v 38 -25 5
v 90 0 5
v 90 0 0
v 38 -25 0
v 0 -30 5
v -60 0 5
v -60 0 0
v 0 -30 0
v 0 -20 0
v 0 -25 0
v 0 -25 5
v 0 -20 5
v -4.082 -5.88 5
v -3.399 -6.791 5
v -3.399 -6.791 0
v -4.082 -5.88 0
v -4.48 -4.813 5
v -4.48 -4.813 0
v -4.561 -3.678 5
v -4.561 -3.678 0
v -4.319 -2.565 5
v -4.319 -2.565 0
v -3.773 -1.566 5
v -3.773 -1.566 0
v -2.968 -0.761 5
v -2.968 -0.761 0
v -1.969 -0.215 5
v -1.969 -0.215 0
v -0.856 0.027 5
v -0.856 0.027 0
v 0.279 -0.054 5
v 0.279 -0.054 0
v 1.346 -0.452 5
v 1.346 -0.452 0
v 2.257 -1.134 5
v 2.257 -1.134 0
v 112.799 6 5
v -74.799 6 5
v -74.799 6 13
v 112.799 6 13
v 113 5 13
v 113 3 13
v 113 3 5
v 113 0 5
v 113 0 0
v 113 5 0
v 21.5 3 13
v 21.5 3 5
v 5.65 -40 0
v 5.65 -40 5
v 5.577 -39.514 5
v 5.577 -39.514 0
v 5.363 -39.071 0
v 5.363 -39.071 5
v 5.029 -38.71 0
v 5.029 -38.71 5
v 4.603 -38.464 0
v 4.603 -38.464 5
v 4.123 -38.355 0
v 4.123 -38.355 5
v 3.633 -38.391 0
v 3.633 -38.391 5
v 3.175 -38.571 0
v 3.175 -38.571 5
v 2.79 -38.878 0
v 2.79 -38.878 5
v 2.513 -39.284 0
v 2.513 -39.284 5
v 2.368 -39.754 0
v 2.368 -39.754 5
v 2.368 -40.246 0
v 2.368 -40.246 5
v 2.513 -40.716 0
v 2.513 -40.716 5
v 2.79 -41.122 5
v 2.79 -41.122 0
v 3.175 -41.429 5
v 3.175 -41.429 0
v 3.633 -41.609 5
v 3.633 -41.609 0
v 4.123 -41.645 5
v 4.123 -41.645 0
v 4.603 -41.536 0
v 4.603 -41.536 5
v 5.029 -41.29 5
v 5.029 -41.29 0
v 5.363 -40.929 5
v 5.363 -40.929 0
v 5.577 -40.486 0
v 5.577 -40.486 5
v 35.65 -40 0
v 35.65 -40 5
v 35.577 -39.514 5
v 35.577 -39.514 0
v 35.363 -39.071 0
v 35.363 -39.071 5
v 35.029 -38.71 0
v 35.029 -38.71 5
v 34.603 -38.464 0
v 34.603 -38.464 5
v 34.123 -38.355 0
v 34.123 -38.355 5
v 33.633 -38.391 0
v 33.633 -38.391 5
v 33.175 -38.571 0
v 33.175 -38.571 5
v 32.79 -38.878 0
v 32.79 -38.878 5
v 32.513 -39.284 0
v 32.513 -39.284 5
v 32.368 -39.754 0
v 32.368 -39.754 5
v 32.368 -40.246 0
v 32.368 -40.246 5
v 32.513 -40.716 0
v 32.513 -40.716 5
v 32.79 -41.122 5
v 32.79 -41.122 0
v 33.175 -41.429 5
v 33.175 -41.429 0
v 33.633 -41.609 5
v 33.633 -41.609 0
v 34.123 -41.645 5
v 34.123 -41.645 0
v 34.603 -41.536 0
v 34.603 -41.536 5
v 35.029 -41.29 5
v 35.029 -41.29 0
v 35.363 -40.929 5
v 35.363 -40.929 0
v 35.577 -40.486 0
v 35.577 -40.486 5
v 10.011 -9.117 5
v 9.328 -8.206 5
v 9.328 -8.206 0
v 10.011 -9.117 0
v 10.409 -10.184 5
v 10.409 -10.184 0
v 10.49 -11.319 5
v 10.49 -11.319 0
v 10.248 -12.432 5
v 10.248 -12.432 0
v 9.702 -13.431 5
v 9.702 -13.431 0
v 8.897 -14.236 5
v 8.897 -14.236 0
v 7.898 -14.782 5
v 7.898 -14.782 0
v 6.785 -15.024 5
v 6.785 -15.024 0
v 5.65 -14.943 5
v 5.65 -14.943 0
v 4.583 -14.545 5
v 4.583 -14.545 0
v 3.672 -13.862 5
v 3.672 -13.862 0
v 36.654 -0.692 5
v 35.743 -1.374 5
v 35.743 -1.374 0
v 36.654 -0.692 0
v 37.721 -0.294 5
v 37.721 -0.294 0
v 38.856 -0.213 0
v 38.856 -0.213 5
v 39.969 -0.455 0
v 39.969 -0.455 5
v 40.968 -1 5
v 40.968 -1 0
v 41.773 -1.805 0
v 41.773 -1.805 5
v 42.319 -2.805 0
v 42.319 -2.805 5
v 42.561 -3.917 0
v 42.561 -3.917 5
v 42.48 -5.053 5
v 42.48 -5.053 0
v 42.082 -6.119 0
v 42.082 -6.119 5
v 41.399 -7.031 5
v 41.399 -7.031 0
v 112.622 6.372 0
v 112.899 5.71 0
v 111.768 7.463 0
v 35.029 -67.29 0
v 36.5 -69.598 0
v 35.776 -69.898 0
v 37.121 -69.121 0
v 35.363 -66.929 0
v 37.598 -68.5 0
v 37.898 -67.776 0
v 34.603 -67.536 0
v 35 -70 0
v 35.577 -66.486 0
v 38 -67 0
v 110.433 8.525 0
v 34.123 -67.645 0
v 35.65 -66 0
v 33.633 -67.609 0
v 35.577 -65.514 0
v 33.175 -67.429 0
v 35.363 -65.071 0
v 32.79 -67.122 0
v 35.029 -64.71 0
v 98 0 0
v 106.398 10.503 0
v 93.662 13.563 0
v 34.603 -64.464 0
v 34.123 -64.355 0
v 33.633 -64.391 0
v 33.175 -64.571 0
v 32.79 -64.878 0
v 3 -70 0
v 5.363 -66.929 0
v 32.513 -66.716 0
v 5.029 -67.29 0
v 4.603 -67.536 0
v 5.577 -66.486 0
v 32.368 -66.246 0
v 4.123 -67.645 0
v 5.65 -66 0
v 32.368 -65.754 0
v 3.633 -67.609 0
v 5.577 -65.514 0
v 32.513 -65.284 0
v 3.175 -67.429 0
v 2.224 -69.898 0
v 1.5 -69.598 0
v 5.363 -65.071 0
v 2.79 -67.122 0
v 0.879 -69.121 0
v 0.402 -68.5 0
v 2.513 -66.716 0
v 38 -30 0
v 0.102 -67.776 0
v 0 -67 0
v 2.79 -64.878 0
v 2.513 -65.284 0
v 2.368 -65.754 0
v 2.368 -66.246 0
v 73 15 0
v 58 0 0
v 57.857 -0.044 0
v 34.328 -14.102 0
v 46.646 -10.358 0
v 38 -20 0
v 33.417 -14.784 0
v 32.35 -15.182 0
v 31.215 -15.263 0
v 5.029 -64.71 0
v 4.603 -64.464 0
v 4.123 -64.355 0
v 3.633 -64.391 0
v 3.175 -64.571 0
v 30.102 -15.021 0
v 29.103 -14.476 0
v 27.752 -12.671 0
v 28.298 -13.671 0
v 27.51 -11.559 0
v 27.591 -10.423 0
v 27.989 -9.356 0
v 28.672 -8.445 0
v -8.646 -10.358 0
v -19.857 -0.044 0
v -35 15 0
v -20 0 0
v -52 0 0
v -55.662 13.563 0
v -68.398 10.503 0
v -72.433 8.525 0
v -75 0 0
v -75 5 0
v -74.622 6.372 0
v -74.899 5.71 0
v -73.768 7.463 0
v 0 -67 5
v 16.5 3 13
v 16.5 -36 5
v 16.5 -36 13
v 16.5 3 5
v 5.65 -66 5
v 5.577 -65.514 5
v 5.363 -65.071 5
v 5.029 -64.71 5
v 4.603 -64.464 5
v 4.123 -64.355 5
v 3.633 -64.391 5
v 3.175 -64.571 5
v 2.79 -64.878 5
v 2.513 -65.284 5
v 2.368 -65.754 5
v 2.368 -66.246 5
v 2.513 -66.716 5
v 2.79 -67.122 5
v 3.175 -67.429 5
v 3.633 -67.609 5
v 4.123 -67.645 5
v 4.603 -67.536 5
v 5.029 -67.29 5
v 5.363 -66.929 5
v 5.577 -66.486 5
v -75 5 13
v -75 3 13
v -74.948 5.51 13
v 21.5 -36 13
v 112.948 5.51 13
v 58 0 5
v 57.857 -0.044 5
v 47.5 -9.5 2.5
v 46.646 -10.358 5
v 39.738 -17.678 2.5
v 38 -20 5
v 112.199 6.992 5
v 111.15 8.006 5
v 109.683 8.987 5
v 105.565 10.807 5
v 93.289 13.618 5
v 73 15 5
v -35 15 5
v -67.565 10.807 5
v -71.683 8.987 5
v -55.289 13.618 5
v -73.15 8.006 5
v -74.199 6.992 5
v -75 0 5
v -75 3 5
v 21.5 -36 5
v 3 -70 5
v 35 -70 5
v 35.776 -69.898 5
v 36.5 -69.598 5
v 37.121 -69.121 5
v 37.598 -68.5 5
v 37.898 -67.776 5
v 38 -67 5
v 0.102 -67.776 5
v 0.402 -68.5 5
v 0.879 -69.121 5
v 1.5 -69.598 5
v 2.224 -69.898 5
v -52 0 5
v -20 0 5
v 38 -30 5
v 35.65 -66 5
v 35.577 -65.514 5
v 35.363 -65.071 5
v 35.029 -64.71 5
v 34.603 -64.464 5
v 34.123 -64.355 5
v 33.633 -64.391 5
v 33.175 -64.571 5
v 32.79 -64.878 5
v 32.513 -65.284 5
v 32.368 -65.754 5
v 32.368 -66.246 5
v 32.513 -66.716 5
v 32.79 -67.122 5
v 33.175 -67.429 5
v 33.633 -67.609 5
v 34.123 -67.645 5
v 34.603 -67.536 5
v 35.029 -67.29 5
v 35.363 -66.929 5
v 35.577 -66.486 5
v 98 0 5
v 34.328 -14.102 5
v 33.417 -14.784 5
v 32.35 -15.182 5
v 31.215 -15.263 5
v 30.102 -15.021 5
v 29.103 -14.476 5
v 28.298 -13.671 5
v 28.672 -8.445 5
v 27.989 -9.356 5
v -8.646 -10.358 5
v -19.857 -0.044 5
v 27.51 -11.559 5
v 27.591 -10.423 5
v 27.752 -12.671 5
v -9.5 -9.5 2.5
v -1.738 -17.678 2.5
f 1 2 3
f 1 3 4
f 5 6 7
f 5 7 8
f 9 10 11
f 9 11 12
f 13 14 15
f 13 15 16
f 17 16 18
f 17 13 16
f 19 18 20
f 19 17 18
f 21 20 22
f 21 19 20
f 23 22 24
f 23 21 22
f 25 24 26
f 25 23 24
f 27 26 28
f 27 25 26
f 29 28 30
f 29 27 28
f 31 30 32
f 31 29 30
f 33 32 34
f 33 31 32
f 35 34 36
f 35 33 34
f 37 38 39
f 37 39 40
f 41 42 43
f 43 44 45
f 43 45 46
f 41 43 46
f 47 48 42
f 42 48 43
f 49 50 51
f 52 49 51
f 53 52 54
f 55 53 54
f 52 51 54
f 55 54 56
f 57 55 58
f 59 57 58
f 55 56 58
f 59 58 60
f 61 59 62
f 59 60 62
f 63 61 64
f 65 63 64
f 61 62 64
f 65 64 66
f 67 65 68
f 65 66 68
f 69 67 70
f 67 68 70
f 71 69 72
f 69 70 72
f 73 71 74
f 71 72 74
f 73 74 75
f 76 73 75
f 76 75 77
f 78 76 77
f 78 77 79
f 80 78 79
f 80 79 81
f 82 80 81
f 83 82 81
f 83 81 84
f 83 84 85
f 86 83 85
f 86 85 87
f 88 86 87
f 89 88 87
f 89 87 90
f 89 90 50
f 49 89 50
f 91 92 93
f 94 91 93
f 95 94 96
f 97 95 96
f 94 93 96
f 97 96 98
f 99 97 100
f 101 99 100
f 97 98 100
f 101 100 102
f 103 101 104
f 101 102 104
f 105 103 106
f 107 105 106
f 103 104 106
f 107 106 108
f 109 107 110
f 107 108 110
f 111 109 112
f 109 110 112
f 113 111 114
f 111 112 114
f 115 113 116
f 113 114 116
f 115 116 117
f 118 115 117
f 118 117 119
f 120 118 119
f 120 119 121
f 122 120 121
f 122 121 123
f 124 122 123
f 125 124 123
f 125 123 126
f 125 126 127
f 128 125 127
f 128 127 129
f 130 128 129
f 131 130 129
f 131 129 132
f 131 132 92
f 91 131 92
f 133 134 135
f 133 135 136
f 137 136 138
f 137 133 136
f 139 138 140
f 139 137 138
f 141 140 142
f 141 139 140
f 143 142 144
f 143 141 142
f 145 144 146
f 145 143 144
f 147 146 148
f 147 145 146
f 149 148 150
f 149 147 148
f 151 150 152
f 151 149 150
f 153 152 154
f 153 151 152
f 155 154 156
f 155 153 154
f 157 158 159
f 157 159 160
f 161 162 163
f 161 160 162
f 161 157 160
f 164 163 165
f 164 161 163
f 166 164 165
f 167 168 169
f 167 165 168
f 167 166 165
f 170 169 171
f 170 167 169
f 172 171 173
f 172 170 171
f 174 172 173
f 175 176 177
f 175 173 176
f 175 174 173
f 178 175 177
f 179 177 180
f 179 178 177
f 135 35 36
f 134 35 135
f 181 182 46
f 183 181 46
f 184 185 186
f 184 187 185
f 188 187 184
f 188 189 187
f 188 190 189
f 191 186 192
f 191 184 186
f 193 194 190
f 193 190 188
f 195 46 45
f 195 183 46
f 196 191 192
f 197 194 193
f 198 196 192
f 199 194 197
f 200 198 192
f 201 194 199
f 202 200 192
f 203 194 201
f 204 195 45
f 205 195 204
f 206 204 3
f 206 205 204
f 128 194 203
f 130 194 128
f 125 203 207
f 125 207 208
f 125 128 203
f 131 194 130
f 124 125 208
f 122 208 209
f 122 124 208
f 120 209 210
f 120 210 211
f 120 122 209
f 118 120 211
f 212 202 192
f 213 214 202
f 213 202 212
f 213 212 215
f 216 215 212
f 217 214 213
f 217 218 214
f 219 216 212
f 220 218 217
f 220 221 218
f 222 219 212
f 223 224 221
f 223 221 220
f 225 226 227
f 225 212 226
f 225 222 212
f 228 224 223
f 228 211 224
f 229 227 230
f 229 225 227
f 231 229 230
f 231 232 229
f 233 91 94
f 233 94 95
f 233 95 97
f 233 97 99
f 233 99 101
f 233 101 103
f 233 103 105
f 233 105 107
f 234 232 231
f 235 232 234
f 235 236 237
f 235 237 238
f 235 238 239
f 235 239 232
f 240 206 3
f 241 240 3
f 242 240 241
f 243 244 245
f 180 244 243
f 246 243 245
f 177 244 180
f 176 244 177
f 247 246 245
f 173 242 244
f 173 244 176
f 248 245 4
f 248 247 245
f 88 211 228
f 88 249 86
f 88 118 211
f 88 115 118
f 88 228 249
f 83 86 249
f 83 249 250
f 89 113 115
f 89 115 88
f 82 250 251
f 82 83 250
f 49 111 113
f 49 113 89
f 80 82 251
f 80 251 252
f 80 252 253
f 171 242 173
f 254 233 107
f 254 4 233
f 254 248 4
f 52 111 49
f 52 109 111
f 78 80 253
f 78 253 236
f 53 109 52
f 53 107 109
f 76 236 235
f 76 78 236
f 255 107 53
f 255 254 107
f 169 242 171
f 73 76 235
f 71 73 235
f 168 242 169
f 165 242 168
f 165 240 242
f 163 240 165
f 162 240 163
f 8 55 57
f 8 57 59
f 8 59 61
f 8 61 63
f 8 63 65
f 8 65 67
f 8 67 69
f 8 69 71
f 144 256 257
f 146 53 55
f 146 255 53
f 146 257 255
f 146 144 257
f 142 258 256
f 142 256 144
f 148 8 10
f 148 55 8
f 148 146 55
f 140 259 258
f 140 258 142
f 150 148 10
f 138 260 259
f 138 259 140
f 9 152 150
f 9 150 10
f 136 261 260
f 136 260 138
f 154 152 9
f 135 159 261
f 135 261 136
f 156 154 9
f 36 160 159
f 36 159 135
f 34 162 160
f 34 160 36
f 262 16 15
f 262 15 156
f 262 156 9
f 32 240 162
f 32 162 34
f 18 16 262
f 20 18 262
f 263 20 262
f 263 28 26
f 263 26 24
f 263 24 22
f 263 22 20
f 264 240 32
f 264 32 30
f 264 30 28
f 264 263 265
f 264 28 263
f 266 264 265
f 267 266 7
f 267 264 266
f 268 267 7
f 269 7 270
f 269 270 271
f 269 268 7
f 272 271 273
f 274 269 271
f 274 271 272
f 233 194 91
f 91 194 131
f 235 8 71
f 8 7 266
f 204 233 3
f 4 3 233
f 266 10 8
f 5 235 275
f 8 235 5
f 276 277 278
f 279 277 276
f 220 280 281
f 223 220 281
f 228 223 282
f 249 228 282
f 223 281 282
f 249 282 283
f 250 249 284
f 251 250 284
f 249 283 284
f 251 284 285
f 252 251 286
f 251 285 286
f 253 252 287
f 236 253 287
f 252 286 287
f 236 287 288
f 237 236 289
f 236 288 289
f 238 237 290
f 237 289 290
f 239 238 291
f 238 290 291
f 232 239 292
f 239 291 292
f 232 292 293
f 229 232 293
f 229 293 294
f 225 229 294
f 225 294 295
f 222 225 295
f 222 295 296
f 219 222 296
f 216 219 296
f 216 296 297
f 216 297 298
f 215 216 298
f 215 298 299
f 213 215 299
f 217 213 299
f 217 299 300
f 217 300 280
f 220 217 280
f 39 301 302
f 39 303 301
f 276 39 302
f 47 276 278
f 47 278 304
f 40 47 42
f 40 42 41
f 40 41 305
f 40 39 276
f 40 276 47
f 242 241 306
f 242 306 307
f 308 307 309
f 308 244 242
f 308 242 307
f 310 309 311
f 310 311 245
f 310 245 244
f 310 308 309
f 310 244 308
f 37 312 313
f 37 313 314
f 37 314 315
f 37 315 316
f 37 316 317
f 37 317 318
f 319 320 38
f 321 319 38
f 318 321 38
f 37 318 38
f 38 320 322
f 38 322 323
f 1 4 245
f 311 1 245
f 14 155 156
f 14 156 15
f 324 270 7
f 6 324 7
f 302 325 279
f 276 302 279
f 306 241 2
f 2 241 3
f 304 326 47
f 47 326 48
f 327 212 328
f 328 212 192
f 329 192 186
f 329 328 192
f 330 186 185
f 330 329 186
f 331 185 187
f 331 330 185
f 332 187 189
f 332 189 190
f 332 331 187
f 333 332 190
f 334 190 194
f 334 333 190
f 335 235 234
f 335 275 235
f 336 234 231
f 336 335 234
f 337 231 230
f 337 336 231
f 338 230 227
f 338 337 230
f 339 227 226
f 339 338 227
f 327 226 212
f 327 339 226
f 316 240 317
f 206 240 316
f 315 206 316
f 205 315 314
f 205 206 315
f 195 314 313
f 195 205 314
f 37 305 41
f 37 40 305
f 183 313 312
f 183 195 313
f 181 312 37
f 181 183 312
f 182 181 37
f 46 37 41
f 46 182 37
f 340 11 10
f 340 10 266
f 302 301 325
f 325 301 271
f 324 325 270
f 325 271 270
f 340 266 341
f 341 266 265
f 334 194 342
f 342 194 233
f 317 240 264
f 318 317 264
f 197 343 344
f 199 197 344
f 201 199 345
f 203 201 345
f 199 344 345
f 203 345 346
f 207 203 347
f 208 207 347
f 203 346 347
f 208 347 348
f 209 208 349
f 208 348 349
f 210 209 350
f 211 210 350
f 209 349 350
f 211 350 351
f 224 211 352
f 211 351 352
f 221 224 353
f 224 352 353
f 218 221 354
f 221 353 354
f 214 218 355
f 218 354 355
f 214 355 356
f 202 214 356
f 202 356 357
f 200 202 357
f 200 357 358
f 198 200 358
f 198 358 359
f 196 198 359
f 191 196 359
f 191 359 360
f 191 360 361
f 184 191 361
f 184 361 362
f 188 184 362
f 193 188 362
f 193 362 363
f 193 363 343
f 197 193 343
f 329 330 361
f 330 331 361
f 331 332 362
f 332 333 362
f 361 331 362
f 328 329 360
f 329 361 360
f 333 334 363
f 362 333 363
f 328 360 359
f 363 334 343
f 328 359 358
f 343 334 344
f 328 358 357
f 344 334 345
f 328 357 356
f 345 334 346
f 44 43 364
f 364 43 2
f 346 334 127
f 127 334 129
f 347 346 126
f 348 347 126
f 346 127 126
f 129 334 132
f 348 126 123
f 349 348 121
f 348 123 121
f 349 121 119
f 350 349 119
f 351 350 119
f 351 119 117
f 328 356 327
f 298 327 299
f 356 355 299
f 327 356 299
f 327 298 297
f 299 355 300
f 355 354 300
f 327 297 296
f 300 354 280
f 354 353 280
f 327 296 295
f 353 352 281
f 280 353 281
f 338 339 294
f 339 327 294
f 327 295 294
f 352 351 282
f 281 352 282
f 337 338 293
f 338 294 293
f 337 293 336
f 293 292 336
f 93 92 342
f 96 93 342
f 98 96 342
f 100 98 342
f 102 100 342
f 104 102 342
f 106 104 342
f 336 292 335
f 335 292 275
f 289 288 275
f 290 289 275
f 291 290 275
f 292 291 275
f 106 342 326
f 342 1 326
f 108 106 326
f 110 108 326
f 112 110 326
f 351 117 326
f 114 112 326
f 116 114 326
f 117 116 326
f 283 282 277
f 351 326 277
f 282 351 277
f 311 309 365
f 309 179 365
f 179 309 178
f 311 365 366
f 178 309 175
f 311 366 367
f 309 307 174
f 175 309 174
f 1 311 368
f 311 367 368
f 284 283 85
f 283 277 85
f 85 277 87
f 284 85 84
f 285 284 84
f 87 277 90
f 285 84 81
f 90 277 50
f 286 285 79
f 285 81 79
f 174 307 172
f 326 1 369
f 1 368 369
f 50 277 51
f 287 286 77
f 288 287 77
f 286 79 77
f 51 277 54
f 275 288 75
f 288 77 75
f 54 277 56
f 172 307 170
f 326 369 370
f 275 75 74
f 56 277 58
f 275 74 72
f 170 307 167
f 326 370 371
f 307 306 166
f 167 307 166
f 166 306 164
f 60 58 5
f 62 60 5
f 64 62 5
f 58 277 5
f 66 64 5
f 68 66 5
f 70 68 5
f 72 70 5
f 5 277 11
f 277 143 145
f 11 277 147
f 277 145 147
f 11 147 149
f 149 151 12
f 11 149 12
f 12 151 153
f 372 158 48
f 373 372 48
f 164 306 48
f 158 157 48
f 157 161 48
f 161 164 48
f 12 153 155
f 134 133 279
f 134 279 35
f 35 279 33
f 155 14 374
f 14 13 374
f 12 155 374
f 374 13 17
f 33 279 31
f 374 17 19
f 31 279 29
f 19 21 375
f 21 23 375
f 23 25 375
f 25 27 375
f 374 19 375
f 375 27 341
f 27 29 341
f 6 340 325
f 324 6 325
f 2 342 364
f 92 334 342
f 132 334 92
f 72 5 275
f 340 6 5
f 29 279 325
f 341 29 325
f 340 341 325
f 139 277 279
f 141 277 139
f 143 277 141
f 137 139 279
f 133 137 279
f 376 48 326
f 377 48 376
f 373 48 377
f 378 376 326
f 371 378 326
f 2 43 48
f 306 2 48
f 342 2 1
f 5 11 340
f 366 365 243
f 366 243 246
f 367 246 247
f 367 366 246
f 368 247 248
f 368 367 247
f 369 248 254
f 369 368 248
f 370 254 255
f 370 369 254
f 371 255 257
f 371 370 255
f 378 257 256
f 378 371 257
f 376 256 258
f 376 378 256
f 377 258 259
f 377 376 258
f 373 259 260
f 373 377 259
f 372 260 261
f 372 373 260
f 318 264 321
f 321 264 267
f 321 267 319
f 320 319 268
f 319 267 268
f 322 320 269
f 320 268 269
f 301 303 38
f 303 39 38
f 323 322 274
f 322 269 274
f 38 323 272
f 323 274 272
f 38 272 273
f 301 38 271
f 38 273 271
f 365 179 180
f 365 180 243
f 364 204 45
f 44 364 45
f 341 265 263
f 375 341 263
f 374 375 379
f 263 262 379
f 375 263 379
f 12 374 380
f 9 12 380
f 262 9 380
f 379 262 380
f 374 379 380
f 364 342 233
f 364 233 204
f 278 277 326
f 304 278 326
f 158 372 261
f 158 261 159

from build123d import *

# Parameters (mm, degrees)
SKETCH1_W           = 38
SKETCH1_H           = 70
BOSS_EXTRUDE1_DEPTH = 5
SKETCH2_R           = 1.65
CUT_EXTRUDE1_DEPTH  = 134.018795664
FILLET1_R           = 3
FILLET2_DEPTH       = 5
SKETCH3_W           = 188
SKETCH3_H           = 3
BOSS_EXTRUDE2_DEPTH = 8
SKETCH4_W           = 5
SKETCH4_H           = 39
BOSS_EXTRUDE3_DEPTH = 8
BOSS_EXTRUDE4_DEPTH = 5
FILLET3_SIZE        = 40
FILLET3_SIZE_2      = 10
FILLET4_SIZE        = 40
FILLET4_SIZE_2      = 10
CUT_EXTRUDE2_DEPTH  = 134.165310942


with BuildPart() as part:
    # Sketch1 → Boss-Extrude1 (new body)
    with BuildSketch(Plane.XY):
        with Locations((19, -35)):
            Rectangle(SKETCH1_W, SKETCH1_H)
        Polygon((-75, 15), (-75, 0), (0, 0), (38, 0), (113, 0), (113, 15), align=None)
    extrude(amount=BOSS_EXTRUDE1_DEPTH)

    # Sketch2 → Cut-Extrude1 (cut, through all)
    with BuildSketch(Plane.XY.offset(5)):
        with Locations((34, -66)):
            Circle(SKETCH2_R)
        with Locations((4, -66)):
            Circle(SKETCH2_R)
        with Locations((4, -40)):
            Circle(SKETCH2_R)
        with Locations((34, -40)):
            Circle(SKETCH2_R)
    extrude(amount=-CUT_EXTRUDE1_DEPTH, mode=Mode.SUBTRACT)

    # Fillet1
    fillet1_edges = [part.edges().sort_by_distance(p)[0] for p in [
        (38, -70, 2.5),
        (0, -70, 2.5),
    ]]
    fillet(fillet1_edges, radius=FILLET1_R)

    # Fillet2: read off the stored shape, not the designer's step
    # Fillet2 outline → Fillet2 (add)
    with BuildSketch(Plane.XY):
        with BuildLine():
            add(Edge.make_bspline(
                [(58, 0), (38, 0), (38, -20)],
                knots=[0, 0, 0, 1, 1, 1], degree=2, weights=[1, 0.052631579, 1]))
            Line((58, 0), (38, 0))
            Line((38, 0), (38, -20))
        make_face()
        with BuildLine():
            Line((0, 0), (-20, 0))
            add(Edge.make_bspline(
                [(-20, 0), (0, 0), (0, -20)],
                knots=[0, 0, 0, 1, 1, 1], degree=2, weights=[1, 0.052631579, 1]))
            Line((0, -20), (0, 0))
        make_face()
    extrude(amount=FILLET2_DEPTH)

    # Sketch3 → Boss-Extrude2 (add)
    with BuildSketch(Plane.XY.offset(5)):
        with Locations((19, 4.5)):
            Rectangle(SKETCH3_W, SKETCH3_H)
    extrude(amount=BOSS_EXTRUDE2_DEPTH)

    # Sketch4 → Boss-Extrude3 (add)
    with BuildSketch(Plane.XY.offset(5)):
        with Locations((19, -16.5)):
            Rectangle(SKETCH4_W, SKETCH4_H)
    extrude(amount=BOSS_EXTRUDE3_DEPTH)

    # Sketch5 → Boss-Extrude4 (add)
    with BuildSketch(Plane.XY.offset(5)):
        Polygon((-52, 0), (-57.902965871, 0), (-60, 0), (0, -30), (0, -25), align=None)
        Polygon((38, -30), (98, 0), (90, 0), (38, -25), align=None)
    extrude(amount=-BOSS_EXTRUDE4_DEPTH)

    # Fillet3
    # a fillet whose section is not a circle: 40, 10 mm, written as the material it takes off along each edge
    with BuildSketch(Plane(origin=(-75, 15, -100), x_dir=(1, 0, 0), z_dir=(0, 0, 1))) as fillet3_piece_1:
        with BuildLine():
            Bezier((FILLET3_SIZE, 0), (0, 0), (0, -FILLET3_SIZE_2), weights=[1, 0.707106781, 1])
            Line((0, -FILLET3_SIZE_2), (0, 0))
            Line((0, 0), (FILLET3_SIZE, 0))
        make_face()
    extrude(amount=205, mode=Mode.SUBTRACT)

    # Fillet4
    # a fillet whose section is not a circle: 40, 10 mm, written as the material it takes off along each edge
    with BuildSketch(Plane(origin=(113, 15, -100), x_dir=(-1, 0, 0), z_dir=(0, 0, 1))) as fillet4_piece_1:
        with BuildLine():
            Bezier((FILLET4_SIZE, 0), (0, 0), (0, FILLET4_SIZE_2), weights=[1, 0.707106781, 1])
            Line((0, FILLET4_SIZE_2), (0, 0))
            Line((0, 0), (FILLET4_SIZE, 0))
        make_face()
    extrude(amount=205, mode=Mode.SUBTRACT)

    # Sketch6 → Cut-Extrude2 (cut, through all)
    with BuildSketch(Plane.XY.offset(5)):
        with BuildLine():
            Line((3.671572875, -13.862410437), (-3.399494937, -6.791342626))
            ThreePointArc((-3.399494937, -6.791342626), (-3.399494937, -1.134488376), (2.257359313, -1.134488376))
            Line((2.257359313, -1.134488376), (9.328427125, -8.205556188))
            ThreePointArc((9.328427125, -8.205556188), (9.328427125, -13.862410437), (3.671572875, -13.862410437))
        make_face()
        with BuildLine():
            Line((28.671572875, -8.445013015), (35.742640687, -1.373945203))
            ThreePointArc((35.742640687, -1.373945203), (41.399494937, -1.373945203), (41.399494937, -7.030799453))
            Line((41.399494937, -7.030799453), (34.328427125, -14.101867265))
            ThreePointArc((34.328427125, -14.101867265), (28.671572875, -14.101867265), (28.671572875, -8.445013015))
        make_face()
    extrude(amount=-CUT_EXTRUDE2_DEPTH, mode=Mode.SUBTRACT)


solid = part.part
